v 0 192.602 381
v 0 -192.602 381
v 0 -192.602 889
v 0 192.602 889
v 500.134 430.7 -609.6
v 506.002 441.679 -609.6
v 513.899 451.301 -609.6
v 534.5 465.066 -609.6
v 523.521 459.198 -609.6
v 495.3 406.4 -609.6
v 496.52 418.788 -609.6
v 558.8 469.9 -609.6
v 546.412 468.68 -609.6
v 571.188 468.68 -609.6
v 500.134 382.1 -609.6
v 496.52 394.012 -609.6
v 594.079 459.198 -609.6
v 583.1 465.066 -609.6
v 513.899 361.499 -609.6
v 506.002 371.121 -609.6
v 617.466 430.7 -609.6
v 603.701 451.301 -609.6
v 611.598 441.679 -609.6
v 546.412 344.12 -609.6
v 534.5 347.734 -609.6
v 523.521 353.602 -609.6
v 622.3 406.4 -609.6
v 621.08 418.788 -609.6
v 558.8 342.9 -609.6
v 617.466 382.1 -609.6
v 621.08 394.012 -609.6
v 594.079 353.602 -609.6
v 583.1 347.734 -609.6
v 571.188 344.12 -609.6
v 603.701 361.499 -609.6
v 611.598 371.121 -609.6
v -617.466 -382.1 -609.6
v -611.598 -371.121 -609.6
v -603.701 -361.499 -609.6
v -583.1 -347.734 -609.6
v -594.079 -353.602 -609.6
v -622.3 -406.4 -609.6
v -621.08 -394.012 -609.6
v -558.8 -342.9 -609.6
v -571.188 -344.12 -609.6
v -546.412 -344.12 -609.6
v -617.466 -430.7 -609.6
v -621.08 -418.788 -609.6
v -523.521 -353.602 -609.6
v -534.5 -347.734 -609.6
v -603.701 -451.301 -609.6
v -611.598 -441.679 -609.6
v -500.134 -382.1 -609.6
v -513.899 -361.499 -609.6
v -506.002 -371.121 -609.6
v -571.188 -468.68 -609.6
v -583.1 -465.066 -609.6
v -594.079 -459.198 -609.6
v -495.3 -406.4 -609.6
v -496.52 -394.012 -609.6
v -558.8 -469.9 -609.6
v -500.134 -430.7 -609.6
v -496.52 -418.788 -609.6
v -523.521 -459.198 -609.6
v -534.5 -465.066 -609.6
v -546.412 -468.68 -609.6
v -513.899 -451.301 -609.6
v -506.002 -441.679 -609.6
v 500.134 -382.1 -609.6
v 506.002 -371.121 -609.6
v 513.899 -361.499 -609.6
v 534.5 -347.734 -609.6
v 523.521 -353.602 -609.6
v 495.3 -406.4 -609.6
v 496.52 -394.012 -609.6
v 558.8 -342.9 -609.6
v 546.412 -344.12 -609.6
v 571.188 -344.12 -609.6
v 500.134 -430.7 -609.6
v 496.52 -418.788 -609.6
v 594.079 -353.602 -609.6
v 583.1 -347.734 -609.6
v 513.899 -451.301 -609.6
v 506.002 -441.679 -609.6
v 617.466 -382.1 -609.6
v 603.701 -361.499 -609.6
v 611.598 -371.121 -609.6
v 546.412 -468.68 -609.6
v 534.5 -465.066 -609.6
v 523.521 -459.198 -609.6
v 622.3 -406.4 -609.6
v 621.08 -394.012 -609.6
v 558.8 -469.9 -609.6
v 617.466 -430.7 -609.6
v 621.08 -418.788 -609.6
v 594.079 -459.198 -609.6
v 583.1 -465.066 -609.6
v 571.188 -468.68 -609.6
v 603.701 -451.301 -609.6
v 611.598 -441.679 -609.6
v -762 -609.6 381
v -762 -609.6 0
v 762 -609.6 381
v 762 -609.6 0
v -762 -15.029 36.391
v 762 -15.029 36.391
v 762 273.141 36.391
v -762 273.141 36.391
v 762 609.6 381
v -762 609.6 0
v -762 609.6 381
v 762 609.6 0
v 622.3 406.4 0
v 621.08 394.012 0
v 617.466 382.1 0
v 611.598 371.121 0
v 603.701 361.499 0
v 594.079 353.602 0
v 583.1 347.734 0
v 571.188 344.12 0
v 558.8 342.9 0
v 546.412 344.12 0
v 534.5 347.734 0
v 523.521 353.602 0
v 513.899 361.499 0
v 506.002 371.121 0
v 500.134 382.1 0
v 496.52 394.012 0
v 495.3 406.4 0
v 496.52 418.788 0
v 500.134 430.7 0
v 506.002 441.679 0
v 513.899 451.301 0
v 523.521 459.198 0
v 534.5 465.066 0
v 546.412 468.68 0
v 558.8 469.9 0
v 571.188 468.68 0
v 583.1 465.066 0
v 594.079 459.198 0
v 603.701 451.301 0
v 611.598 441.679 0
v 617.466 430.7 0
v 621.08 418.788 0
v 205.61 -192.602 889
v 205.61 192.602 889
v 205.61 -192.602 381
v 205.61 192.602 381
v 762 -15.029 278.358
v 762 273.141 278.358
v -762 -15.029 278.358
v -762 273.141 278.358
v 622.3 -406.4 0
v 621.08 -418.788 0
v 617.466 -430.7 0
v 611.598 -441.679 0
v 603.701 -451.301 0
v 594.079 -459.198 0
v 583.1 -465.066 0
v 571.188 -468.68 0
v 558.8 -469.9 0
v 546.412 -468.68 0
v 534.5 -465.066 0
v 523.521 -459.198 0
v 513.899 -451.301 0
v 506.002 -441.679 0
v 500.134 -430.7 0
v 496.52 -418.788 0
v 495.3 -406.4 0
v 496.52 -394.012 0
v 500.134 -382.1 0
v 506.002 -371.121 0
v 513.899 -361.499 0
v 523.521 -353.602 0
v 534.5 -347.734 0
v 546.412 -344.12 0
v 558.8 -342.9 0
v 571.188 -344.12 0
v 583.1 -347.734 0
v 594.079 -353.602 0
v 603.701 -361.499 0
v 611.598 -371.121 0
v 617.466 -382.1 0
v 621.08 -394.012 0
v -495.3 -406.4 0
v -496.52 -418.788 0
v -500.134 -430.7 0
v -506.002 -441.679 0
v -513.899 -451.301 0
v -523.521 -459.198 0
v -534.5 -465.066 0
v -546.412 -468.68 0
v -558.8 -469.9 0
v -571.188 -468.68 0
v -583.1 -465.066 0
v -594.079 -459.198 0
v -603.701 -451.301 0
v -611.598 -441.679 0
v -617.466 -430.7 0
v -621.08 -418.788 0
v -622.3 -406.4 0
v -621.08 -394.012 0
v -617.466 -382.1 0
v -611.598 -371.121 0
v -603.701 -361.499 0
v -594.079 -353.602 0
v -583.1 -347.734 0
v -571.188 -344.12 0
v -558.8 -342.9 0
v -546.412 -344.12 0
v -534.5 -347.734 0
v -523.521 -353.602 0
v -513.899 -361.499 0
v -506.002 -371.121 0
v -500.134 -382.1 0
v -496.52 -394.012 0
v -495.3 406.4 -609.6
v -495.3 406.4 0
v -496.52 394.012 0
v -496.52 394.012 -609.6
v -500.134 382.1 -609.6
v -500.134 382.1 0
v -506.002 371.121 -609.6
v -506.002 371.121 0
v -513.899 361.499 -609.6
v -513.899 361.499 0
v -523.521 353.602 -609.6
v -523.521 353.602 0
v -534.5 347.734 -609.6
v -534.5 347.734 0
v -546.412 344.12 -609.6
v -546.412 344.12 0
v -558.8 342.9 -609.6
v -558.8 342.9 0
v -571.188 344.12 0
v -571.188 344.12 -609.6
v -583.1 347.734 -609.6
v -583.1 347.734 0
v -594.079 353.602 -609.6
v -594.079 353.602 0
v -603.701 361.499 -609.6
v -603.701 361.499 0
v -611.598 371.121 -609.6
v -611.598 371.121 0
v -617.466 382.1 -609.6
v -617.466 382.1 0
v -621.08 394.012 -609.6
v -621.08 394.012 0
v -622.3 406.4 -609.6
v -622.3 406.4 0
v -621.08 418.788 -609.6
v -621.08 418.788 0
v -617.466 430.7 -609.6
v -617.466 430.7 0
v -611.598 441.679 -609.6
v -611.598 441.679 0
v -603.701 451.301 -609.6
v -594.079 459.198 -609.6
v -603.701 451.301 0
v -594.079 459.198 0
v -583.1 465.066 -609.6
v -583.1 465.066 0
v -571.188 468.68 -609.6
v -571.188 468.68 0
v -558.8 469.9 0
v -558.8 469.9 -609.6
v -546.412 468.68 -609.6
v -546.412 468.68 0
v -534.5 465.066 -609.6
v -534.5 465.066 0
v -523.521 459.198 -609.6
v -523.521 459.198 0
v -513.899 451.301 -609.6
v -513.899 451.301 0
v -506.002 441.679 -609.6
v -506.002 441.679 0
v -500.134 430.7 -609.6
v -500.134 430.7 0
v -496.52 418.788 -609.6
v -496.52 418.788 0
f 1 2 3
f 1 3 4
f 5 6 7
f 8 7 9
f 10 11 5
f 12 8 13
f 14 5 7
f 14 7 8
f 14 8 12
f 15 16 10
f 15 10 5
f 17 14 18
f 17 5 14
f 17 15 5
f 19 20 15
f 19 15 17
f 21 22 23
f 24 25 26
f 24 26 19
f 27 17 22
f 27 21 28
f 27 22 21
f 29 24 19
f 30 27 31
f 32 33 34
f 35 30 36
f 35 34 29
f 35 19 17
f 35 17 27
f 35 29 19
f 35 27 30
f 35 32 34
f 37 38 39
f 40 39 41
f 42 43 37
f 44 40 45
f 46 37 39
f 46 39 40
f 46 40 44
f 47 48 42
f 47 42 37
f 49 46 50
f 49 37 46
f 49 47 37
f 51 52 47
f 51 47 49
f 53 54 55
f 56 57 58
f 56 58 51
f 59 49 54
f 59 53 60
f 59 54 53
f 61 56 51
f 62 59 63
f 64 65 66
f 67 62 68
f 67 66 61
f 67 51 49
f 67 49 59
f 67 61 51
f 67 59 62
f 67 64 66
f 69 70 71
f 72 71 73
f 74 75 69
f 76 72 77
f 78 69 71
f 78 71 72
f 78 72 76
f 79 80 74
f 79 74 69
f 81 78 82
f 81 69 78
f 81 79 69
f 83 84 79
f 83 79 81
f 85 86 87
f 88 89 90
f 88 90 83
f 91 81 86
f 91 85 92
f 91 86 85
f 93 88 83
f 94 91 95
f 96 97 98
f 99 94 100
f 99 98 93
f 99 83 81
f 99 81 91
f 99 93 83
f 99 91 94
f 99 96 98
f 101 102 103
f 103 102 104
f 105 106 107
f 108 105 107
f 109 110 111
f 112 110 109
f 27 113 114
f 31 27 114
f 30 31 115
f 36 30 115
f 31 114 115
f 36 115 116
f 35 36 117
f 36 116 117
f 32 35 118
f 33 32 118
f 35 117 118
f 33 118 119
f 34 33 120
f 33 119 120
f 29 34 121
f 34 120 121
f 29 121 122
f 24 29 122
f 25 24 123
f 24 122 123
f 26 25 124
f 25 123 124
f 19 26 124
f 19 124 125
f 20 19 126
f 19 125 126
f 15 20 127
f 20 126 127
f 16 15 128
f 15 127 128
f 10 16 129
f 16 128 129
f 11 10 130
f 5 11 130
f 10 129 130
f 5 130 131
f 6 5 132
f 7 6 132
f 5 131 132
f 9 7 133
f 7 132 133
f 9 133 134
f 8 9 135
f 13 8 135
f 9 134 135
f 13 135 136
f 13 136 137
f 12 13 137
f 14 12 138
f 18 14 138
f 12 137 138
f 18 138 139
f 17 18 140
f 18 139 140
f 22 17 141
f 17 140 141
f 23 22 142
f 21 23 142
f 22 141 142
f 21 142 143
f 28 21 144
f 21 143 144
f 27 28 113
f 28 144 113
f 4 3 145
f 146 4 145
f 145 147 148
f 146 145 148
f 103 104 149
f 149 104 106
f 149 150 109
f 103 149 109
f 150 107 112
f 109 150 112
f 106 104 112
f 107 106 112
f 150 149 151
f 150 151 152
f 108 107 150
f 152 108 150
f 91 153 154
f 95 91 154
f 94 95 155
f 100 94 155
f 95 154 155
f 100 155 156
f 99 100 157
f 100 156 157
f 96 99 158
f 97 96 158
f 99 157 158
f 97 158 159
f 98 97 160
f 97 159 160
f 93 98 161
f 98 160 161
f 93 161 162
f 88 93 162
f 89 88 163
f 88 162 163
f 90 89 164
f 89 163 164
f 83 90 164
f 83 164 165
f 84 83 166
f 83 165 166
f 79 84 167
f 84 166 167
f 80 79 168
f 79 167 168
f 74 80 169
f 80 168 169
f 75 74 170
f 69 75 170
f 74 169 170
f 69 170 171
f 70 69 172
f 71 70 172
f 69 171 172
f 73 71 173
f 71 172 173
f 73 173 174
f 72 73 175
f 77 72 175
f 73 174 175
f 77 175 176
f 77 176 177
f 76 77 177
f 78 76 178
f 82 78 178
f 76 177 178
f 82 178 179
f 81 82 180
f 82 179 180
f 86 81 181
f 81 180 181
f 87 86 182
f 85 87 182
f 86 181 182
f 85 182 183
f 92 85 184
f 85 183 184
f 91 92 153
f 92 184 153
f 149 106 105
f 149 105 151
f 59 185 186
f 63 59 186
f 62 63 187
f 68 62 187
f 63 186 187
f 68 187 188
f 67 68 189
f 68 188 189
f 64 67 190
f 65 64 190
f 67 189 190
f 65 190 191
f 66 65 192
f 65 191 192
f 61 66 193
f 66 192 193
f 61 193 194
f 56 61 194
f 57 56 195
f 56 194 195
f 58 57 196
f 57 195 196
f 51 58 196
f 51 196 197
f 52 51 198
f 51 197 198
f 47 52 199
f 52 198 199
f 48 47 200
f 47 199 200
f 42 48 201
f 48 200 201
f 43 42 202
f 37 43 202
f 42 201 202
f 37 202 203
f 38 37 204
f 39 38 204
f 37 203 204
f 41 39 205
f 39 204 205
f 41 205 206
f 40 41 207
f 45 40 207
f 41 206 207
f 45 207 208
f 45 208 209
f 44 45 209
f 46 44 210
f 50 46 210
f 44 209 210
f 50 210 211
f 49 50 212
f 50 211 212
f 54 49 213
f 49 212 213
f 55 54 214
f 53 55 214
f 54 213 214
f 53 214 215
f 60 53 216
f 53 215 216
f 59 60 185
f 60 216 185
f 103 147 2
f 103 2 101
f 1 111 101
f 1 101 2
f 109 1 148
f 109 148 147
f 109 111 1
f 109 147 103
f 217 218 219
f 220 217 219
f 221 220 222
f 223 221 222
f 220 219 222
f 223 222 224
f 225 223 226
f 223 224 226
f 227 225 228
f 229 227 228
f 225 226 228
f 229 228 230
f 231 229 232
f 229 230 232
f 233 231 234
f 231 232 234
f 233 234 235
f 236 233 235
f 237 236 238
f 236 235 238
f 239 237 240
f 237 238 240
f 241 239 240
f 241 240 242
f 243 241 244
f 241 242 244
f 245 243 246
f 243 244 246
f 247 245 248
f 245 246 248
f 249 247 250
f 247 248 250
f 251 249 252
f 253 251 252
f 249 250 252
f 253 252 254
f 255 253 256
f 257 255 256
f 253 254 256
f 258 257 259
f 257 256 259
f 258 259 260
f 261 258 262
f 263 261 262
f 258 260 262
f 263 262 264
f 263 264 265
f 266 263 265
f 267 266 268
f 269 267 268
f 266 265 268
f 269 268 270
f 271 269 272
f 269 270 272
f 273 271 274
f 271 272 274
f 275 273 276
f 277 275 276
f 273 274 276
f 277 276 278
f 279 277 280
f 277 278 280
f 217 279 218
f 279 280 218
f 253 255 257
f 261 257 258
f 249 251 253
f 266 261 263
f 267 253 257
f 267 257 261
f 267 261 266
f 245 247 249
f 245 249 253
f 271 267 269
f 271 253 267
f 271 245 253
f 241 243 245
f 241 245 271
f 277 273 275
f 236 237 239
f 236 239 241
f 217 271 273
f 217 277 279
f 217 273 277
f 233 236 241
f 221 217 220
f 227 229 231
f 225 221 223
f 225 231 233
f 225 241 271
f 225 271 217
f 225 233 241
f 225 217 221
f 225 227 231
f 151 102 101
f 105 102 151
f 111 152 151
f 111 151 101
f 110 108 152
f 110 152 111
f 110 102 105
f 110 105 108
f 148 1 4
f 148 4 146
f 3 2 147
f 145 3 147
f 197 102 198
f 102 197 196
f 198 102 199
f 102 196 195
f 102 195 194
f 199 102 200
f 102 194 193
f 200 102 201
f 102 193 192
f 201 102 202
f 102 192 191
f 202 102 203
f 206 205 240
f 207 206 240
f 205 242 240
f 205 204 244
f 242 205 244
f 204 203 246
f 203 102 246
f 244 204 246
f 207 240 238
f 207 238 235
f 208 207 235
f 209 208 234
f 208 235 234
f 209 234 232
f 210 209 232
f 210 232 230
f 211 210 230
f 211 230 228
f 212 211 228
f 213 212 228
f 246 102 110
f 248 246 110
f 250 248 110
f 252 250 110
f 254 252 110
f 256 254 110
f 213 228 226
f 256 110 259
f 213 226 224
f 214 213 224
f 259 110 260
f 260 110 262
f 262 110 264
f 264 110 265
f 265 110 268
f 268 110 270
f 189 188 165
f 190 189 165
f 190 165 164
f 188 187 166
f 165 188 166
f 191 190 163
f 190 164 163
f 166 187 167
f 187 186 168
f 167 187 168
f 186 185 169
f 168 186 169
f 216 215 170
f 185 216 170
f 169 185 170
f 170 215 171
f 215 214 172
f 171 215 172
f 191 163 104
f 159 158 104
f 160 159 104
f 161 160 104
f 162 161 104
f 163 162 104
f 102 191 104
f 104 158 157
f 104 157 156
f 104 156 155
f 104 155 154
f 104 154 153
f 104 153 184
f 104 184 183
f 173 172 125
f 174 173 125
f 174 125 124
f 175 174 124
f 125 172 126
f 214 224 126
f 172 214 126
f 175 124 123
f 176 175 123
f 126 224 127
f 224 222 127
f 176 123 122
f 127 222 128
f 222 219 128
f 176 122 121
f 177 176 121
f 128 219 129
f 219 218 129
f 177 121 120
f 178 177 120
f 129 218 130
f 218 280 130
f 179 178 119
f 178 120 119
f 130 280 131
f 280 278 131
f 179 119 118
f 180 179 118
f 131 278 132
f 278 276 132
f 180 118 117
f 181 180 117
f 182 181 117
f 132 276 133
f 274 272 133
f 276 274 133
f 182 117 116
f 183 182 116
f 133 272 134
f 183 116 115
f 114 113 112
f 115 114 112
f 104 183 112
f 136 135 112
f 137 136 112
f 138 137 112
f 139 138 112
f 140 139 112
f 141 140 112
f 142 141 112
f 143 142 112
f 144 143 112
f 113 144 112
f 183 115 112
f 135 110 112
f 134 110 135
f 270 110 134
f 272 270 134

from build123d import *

# Parameters (mm, degrees)
F0_W     = 1524
F0_H     = 1219.2
F1_DEPTH = 381
F2_R     = 63.5
F3_DEPTH = 609.6
F4_W     = 288.1702780724
F4_H     = 241.9668510556
F5_DEPTH = 1524
F7_W     = 205.6101411581
F7_H     = 385.203063488
F8_DEPTH = 508


with BuildPart() as f1:
    # F0 (on Top) → F1 (new body)
    with BuildSketch(Plane.XY):
        Rectangle(F0_W, F0_H)
    extrude(amount=F1_DEPTH)

    # F2 (on face) → F3 (join)
    with BuildSketch(Plane(origin=(0, 0, 0), x_dir=(1, 0, 0), z_dir=(0, 0, -1))):
        with Locations((-558.8, -406.4)):
            Circle(F2_R)
        with Locations((-558.8, 406.4)):
            Circle(F2_R)
        with Locations((558.8, 406.4)):
            Circle(F2_R)
        with Locations((558.8, -406.4)):
            Circle(F2_R)
    extrude(amount=F3_DEPTH)

    # F4 (on face) → F5 (cut, through all)
    with BuildSketch(Plane.YZ.offset(762)):
        with Locations((129.0563344955, 157.3744080961)):
            Rectangle(F4_W, F4_H)
    extrude(amount=-F5_DEPTH, mode=Mode.SUBTRACT)

    # F7 (on face) → F8 (join)
    with BuildSketch(Plane.XY.offset(381)):
        with Locations((102.8050705791, 0)):
            Rectangle(F7_W, F7_H)
    extrude(amount=F8_DEPTH)


solid = f1.part
